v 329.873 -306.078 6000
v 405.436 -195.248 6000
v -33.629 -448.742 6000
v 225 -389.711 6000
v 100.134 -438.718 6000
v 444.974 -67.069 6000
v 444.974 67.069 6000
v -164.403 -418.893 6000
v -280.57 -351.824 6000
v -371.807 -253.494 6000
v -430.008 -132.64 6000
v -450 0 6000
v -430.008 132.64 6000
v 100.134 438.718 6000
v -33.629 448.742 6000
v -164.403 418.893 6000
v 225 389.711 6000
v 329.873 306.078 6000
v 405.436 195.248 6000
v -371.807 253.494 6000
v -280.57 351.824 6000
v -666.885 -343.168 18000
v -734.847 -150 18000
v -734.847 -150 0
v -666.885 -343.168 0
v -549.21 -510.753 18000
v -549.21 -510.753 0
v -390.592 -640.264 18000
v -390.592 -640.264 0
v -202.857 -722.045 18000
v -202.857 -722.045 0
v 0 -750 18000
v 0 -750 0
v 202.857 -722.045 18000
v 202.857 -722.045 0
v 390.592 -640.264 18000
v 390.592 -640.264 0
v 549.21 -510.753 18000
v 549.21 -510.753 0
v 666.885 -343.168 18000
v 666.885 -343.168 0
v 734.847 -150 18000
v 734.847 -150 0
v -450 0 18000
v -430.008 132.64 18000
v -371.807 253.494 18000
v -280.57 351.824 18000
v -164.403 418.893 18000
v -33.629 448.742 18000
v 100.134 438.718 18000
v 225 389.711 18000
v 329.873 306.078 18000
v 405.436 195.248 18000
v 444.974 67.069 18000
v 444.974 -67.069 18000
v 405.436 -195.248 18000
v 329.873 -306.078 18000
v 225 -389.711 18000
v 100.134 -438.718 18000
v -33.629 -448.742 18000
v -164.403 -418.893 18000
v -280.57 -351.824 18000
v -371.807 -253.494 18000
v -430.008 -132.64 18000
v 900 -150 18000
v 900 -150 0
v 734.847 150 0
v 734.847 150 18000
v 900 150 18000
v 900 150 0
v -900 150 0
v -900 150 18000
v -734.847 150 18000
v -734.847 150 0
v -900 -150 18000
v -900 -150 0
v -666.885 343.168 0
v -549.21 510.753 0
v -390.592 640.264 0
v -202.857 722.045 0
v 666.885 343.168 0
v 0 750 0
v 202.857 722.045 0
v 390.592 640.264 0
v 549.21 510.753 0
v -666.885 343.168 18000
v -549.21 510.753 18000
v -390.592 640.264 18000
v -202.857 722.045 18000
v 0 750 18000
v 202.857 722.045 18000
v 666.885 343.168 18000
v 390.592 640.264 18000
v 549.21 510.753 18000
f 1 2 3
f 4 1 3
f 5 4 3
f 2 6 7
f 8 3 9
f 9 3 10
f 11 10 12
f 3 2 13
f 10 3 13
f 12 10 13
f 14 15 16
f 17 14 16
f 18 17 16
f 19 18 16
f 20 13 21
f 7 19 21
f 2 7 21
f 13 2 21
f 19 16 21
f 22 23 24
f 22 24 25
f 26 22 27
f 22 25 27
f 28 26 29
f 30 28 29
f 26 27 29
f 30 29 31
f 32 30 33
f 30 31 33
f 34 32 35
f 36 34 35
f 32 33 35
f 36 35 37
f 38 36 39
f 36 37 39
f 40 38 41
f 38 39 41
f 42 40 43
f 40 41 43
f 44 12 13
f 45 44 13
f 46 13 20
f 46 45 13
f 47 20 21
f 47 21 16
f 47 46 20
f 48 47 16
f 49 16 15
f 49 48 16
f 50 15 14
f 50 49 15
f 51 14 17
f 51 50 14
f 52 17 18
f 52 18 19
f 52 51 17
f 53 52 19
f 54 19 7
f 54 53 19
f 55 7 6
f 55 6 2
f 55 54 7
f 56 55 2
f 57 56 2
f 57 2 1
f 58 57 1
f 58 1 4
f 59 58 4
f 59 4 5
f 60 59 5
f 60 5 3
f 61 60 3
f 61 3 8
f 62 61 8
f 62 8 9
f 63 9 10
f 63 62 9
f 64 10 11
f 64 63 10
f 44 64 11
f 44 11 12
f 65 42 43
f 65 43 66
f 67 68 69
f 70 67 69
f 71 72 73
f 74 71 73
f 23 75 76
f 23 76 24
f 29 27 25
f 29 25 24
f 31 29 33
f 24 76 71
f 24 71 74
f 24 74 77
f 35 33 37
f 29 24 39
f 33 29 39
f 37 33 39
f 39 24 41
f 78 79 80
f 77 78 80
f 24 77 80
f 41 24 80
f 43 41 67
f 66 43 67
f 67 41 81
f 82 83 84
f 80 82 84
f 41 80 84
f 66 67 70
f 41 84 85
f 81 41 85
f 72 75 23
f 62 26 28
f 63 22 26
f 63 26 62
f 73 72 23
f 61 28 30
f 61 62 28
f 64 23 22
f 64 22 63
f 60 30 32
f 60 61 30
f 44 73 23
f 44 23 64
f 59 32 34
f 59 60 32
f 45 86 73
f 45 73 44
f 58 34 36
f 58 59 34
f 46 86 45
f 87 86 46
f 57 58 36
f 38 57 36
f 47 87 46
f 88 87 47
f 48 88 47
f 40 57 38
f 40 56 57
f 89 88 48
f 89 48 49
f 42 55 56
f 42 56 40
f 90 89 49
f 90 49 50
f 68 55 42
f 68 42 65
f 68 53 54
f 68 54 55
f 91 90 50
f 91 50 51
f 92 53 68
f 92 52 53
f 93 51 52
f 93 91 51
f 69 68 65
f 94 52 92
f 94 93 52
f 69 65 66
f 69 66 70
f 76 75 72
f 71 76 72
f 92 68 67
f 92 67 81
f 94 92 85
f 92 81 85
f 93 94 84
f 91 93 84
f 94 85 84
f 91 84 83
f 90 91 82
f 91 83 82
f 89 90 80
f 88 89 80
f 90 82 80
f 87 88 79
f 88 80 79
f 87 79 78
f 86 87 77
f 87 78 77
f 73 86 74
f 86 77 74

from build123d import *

# Parameters (mm, degrees)
SKETCH1_R           = 750
BOSS_EXTRUDE1_DEPTH = 18000
SKETCH2_W           = 1800
SKETCH2_H           = 300
BOSS_EXTRUDE2_DEPTH = 18000
CUT_EXTRUDE1_START  = -18000
SKETCH3_R           = 450
CUT_EXTRUDE1_DEPTH  = 12000


with BuildPart() as part:
    # Sketch1 → Boss-Extrude1 (new body)
    with BuildSketch(Plane.XY):
        Circle(SKETCH1_R)
    extrude(amount=BOSS_EXTRUDE1_DEPTH)

    # Sketch2 → Boss-Extrude2 (add)
    with BuildSketch(Plane.XY.offset(18000)):
        Rectangle(SKETCH2_W, SKETCH2_H)
    extrude(amount=-BOSS_EXTRUDE2_DEPTH)

    # Sketch3 → Cut-Extrude1 (cut)
    with BuildSketch(Plane(origin=(0, 0, 0), x_dir=(-1, 0, 0), z_dir=(0, 0, -1)).offset(CUT_EXTRUDE1_START)):
        Circle(SKETCH3_R)
    extrude(amount=CUT_EXTRUDE1_DEPTH, mode=Mode.SUBTRACT)


solid = part.part
